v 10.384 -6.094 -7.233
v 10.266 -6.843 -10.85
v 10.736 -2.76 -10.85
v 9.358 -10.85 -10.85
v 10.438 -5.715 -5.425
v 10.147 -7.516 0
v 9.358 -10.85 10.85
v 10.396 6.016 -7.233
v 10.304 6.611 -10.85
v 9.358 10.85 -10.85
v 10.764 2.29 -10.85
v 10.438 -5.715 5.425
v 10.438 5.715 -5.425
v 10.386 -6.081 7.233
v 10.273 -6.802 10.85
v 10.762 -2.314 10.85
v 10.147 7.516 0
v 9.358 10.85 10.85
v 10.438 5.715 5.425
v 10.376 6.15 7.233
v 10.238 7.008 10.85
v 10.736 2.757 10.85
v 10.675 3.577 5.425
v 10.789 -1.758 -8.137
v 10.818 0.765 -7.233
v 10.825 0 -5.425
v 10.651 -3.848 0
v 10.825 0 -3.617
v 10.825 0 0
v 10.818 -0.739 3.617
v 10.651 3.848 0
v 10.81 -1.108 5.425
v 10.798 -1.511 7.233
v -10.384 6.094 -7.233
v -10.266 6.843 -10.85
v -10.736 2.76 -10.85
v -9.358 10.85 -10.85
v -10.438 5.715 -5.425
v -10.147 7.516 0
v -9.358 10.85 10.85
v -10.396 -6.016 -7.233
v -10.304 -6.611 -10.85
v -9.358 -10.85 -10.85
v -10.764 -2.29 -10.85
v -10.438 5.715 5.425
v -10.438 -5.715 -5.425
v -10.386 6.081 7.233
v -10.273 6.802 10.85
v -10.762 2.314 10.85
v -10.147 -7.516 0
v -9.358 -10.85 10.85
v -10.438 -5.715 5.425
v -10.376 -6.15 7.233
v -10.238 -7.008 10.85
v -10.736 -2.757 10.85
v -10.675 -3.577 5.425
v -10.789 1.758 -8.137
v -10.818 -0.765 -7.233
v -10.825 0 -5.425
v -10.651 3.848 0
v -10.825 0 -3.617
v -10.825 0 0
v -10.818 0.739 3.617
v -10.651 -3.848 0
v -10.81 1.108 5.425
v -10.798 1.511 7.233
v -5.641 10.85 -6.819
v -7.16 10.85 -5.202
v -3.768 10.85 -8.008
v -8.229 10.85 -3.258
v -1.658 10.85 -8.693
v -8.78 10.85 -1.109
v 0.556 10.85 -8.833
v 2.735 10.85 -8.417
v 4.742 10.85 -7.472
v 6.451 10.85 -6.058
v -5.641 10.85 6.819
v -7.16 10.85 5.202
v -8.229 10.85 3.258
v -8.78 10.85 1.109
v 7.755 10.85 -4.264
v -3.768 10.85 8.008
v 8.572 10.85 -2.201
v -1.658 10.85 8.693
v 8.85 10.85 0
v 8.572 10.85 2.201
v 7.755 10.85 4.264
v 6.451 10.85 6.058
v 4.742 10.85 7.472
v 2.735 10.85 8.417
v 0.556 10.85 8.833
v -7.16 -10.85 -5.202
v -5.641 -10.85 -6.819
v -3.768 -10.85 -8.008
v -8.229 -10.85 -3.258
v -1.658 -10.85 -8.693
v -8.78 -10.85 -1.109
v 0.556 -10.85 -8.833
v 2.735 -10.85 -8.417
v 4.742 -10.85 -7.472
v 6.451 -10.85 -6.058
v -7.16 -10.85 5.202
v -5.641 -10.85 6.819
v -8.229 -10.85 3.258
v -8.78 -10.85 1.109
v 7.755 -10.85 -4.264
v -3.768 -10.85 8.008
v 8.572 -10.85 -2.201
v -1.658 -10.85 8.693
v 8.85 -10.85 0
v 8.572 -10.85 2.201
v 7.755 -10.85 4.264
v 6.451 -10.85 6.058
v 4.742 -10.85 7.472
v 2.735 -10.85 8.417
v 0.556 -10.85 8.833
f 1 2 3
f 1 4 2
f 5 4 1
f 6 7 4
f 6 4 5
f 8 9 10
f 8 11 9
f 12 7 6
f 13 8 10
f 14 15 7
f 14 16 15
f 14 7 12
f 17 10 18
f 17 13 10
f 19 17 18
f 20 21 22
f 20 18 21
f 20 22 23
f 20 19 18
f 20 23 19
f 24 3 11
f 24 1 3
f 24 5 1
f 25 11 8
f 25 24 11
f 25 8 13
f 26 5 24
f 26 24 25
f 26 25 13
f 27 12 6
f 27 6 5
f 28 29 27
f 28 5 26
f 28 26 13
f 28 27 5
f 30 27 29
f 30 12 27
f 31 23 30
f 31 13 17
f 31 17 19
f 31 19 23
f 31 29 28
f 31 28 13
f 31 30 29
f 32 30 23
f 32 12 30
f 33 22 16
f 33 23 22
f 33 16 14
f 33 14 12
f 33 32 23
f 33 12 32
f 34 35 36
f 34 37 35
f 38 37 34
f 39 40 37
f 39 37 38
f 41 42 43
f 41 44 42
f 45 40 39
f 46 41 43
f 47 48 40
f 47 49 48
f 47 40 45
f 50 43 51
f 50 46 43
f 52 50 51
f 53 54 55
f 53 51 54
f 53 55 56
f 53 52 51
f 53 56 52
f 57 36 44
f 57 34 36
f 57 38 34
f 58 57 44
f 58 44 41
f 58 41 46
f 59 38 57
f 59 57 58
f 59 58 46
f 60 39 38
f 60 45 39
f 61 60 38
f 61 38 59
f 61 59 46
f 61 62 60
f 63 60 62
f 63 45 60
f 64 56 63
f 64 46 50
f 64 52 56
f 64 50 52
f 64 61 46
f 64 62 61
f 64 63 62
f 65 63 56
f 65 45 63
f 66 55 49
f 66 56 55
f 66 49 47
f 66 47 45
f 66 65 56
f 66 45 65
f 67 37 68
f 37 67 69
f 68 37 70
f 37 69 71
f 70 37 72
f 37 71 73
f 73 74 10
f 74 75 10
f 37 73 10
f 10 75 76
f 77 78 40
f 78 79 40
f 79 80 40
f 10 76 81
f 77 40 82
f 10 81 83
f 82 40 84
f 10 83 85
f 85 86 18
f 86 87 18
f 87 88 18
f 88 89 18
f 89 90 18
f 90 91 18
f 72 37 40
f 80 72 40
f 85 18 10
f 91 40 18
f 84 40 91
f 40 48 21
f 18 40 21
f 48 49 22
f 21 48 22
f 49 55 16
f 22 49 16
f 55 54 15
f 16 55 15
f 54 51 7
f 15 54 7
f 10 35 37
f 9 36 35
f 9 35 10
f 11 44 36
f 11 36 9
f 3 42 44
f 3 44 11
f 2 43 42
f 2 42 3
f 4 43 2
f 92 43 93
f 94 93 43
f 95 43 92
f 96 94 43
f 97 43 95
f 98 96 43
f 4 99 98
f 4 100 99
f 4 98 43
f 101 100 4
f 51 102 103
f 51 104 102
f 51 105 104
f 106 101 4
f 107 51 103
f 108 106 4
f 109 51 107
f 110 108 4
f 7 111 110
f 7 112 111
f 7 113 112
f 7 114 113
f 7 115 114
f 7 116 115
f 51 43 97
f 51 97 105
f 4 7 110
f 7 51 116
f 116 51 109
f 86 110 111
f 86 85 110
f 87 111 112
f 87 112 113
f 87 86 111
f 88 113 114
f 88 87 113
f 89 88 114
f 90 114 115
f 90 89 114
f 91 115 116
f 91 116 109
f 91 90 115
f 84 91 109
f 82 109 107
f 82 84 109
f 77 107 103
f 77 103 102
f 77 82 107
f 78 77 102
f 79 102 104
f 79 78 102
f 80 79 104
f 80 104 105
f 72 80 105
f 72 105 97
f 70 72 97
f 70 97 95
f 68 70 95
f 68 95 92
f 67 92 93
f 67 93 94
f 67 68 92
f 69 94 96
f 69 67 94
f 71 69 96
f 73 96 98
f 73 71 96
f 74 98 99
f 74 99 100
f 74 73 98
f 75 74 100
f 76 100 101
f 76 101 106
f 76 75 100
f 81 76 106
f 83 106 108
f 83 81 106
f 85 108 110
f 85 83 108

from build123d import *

# Parameters (mm, degrees)
F0_W          = 21.7
F0_H          = 21.7
F0_R          = 8.85
F1_DEPTH      = 10.85
F1_DEPTH_BACK = 10.85
F3_DEPTH      = 25


with BuildPart() as f1:
    # F0 (on Front) → F1 (new body, two sides)
    with BuildSketch(Plane.XZ) as f1_sk:
        Rectangle(F0_W, F0_H)
        Circle(F0_R, mode=Mode.SUBTRACT)
    extrude(amount=F1_DEPTH)
    extrude(f1_sk.sketch, amount=-F1_DEPTH_BACK)

    # F2 (on face) → F3 (cut)
    with BuildSketch(Plane.XY.offset(10.85)):
        with BuildLine():
            add(Edge.make_bspline(
                [(7.9357599601, -14.6792419255), (8.7533080621, -12.9220378395), (9.3575897376, -10.85)],
                knots=[0.8228915355, 0.8228915355, 0.8228915355, 1.0440868221, 1.0440868221, 1.0440868221], degree=2, weights=[1, 0.9938903122, 1]))
            Line((7.9357599601, -14.6792419255), (17.9156405647, -14.6792419255))
            Line((17.9156405647, -14.6792419255), (17.9156405647, 12.7848008303))
            Line((17.9156405647, 12.7848008303), (8.7213948385, 12.7848008303))
            add(Edge.make_bspline(
                [(9.3575897376, 10.85), (9.0655324995, 11.8514429913), (8.7213948385, 12.7848008303)],
                knots=[2.0975058315, 2.0975058315, 2.0975058315, 2.2047475395, 2.2047475395, 2.2047475395], degree=2, weights=[1, 0.9985627464, 1]))
            Line((9.3575897376, 10.85), (10.85, 10.85))
            Line((10.85, 10.85), (10.85, -10.85))
            Line((10.85, -10.85), (9.3575897376, -10.85))
        make_face()
        with BuildLine():
            Line((-17.9156405647, -14.6792419255), (-7.9357599601, -14.6792419255))
            add(Edge.make_bspline(
                [(-9.3575897376, -10.85), (-8.7533080621, -12.9220378395), (-7.9357599601, -14.6792419255)],
                knots=[5.2390984851, 5.2390984851, 5.2390984851, 5.4602937717, 5.4602937717, 5.4602937717], degree=2, weights=[1, 0.9938903122, 1]))
            Line((-9.3575897376, -10.85), (-10.85, -10.85))
            Line((-10.85, -10.85), (-10.85, 10.85))
            Line((-10.85, 10.85), (-9.3575897376, 10.85))
            add(Edge.make_bspline(
                [(-8.7213948385, 12.7848008303), (-9.0655324995, 11.8514429913), (-9.3575897376, 10.85)],
                knots=[4.0784377676, 4.0784377676, 4.0784377676, 4.1856794756, 4.1856794756, 4.1856794756], degree=2, weights=[1, 0.9985627464, 1]))
            Line((-8.7213948385, 12.7848008303), (-17.9156405647, 12.7848008303))
            Line((-17.9156405647, 12.7848008303), (-17.9156405647, -14.6792419255))
        make_face()
        with BuildLine():
            add(Edge.make_bspline(
                [(9.3575897376, -10.85), (12.5218447792, 0), (9.3575897376, 10.85)],
                knots=[1.0440868221, 1.0440868221, 1.0440868221, 2.0975058315, 2.0975058315, 2.0975058315], degree=2, weights=[1, 0.8644658516, 1]))
            Line((9.3575897376, -10.85), (10.85, -10.85))
            Line((10.85, -10.85), (10.85, 10.85))
            Line((10.85, 10.85), (9.3575897376, 10.85))
        make_face()
        with BuildLine():
            Line((-10.85, -10.85), (-9.3575897376, -10.85))
            add(Edge.make_bspline(
                [(-9.3575897376, 10.85), (-12.5218447792, 0), (-9.3575897376, -10.85)],
                knots=[4.1856794756, 4.1856794756, 4.1856794756, 5.2390984851, 5.2390984851, 5.2390984851], degree=2, weights=[1, 0.8644658516, 1]))
            Line((-9.3575897376, 10.85), (-10.85, 10.85))
            Line((-10.85, 10.85), (-10.85, -10.85))
        make_face()
    extrude(amount=-F3_DEPTH, mode=Mode.SUBTRACT)


solid = f1.part
